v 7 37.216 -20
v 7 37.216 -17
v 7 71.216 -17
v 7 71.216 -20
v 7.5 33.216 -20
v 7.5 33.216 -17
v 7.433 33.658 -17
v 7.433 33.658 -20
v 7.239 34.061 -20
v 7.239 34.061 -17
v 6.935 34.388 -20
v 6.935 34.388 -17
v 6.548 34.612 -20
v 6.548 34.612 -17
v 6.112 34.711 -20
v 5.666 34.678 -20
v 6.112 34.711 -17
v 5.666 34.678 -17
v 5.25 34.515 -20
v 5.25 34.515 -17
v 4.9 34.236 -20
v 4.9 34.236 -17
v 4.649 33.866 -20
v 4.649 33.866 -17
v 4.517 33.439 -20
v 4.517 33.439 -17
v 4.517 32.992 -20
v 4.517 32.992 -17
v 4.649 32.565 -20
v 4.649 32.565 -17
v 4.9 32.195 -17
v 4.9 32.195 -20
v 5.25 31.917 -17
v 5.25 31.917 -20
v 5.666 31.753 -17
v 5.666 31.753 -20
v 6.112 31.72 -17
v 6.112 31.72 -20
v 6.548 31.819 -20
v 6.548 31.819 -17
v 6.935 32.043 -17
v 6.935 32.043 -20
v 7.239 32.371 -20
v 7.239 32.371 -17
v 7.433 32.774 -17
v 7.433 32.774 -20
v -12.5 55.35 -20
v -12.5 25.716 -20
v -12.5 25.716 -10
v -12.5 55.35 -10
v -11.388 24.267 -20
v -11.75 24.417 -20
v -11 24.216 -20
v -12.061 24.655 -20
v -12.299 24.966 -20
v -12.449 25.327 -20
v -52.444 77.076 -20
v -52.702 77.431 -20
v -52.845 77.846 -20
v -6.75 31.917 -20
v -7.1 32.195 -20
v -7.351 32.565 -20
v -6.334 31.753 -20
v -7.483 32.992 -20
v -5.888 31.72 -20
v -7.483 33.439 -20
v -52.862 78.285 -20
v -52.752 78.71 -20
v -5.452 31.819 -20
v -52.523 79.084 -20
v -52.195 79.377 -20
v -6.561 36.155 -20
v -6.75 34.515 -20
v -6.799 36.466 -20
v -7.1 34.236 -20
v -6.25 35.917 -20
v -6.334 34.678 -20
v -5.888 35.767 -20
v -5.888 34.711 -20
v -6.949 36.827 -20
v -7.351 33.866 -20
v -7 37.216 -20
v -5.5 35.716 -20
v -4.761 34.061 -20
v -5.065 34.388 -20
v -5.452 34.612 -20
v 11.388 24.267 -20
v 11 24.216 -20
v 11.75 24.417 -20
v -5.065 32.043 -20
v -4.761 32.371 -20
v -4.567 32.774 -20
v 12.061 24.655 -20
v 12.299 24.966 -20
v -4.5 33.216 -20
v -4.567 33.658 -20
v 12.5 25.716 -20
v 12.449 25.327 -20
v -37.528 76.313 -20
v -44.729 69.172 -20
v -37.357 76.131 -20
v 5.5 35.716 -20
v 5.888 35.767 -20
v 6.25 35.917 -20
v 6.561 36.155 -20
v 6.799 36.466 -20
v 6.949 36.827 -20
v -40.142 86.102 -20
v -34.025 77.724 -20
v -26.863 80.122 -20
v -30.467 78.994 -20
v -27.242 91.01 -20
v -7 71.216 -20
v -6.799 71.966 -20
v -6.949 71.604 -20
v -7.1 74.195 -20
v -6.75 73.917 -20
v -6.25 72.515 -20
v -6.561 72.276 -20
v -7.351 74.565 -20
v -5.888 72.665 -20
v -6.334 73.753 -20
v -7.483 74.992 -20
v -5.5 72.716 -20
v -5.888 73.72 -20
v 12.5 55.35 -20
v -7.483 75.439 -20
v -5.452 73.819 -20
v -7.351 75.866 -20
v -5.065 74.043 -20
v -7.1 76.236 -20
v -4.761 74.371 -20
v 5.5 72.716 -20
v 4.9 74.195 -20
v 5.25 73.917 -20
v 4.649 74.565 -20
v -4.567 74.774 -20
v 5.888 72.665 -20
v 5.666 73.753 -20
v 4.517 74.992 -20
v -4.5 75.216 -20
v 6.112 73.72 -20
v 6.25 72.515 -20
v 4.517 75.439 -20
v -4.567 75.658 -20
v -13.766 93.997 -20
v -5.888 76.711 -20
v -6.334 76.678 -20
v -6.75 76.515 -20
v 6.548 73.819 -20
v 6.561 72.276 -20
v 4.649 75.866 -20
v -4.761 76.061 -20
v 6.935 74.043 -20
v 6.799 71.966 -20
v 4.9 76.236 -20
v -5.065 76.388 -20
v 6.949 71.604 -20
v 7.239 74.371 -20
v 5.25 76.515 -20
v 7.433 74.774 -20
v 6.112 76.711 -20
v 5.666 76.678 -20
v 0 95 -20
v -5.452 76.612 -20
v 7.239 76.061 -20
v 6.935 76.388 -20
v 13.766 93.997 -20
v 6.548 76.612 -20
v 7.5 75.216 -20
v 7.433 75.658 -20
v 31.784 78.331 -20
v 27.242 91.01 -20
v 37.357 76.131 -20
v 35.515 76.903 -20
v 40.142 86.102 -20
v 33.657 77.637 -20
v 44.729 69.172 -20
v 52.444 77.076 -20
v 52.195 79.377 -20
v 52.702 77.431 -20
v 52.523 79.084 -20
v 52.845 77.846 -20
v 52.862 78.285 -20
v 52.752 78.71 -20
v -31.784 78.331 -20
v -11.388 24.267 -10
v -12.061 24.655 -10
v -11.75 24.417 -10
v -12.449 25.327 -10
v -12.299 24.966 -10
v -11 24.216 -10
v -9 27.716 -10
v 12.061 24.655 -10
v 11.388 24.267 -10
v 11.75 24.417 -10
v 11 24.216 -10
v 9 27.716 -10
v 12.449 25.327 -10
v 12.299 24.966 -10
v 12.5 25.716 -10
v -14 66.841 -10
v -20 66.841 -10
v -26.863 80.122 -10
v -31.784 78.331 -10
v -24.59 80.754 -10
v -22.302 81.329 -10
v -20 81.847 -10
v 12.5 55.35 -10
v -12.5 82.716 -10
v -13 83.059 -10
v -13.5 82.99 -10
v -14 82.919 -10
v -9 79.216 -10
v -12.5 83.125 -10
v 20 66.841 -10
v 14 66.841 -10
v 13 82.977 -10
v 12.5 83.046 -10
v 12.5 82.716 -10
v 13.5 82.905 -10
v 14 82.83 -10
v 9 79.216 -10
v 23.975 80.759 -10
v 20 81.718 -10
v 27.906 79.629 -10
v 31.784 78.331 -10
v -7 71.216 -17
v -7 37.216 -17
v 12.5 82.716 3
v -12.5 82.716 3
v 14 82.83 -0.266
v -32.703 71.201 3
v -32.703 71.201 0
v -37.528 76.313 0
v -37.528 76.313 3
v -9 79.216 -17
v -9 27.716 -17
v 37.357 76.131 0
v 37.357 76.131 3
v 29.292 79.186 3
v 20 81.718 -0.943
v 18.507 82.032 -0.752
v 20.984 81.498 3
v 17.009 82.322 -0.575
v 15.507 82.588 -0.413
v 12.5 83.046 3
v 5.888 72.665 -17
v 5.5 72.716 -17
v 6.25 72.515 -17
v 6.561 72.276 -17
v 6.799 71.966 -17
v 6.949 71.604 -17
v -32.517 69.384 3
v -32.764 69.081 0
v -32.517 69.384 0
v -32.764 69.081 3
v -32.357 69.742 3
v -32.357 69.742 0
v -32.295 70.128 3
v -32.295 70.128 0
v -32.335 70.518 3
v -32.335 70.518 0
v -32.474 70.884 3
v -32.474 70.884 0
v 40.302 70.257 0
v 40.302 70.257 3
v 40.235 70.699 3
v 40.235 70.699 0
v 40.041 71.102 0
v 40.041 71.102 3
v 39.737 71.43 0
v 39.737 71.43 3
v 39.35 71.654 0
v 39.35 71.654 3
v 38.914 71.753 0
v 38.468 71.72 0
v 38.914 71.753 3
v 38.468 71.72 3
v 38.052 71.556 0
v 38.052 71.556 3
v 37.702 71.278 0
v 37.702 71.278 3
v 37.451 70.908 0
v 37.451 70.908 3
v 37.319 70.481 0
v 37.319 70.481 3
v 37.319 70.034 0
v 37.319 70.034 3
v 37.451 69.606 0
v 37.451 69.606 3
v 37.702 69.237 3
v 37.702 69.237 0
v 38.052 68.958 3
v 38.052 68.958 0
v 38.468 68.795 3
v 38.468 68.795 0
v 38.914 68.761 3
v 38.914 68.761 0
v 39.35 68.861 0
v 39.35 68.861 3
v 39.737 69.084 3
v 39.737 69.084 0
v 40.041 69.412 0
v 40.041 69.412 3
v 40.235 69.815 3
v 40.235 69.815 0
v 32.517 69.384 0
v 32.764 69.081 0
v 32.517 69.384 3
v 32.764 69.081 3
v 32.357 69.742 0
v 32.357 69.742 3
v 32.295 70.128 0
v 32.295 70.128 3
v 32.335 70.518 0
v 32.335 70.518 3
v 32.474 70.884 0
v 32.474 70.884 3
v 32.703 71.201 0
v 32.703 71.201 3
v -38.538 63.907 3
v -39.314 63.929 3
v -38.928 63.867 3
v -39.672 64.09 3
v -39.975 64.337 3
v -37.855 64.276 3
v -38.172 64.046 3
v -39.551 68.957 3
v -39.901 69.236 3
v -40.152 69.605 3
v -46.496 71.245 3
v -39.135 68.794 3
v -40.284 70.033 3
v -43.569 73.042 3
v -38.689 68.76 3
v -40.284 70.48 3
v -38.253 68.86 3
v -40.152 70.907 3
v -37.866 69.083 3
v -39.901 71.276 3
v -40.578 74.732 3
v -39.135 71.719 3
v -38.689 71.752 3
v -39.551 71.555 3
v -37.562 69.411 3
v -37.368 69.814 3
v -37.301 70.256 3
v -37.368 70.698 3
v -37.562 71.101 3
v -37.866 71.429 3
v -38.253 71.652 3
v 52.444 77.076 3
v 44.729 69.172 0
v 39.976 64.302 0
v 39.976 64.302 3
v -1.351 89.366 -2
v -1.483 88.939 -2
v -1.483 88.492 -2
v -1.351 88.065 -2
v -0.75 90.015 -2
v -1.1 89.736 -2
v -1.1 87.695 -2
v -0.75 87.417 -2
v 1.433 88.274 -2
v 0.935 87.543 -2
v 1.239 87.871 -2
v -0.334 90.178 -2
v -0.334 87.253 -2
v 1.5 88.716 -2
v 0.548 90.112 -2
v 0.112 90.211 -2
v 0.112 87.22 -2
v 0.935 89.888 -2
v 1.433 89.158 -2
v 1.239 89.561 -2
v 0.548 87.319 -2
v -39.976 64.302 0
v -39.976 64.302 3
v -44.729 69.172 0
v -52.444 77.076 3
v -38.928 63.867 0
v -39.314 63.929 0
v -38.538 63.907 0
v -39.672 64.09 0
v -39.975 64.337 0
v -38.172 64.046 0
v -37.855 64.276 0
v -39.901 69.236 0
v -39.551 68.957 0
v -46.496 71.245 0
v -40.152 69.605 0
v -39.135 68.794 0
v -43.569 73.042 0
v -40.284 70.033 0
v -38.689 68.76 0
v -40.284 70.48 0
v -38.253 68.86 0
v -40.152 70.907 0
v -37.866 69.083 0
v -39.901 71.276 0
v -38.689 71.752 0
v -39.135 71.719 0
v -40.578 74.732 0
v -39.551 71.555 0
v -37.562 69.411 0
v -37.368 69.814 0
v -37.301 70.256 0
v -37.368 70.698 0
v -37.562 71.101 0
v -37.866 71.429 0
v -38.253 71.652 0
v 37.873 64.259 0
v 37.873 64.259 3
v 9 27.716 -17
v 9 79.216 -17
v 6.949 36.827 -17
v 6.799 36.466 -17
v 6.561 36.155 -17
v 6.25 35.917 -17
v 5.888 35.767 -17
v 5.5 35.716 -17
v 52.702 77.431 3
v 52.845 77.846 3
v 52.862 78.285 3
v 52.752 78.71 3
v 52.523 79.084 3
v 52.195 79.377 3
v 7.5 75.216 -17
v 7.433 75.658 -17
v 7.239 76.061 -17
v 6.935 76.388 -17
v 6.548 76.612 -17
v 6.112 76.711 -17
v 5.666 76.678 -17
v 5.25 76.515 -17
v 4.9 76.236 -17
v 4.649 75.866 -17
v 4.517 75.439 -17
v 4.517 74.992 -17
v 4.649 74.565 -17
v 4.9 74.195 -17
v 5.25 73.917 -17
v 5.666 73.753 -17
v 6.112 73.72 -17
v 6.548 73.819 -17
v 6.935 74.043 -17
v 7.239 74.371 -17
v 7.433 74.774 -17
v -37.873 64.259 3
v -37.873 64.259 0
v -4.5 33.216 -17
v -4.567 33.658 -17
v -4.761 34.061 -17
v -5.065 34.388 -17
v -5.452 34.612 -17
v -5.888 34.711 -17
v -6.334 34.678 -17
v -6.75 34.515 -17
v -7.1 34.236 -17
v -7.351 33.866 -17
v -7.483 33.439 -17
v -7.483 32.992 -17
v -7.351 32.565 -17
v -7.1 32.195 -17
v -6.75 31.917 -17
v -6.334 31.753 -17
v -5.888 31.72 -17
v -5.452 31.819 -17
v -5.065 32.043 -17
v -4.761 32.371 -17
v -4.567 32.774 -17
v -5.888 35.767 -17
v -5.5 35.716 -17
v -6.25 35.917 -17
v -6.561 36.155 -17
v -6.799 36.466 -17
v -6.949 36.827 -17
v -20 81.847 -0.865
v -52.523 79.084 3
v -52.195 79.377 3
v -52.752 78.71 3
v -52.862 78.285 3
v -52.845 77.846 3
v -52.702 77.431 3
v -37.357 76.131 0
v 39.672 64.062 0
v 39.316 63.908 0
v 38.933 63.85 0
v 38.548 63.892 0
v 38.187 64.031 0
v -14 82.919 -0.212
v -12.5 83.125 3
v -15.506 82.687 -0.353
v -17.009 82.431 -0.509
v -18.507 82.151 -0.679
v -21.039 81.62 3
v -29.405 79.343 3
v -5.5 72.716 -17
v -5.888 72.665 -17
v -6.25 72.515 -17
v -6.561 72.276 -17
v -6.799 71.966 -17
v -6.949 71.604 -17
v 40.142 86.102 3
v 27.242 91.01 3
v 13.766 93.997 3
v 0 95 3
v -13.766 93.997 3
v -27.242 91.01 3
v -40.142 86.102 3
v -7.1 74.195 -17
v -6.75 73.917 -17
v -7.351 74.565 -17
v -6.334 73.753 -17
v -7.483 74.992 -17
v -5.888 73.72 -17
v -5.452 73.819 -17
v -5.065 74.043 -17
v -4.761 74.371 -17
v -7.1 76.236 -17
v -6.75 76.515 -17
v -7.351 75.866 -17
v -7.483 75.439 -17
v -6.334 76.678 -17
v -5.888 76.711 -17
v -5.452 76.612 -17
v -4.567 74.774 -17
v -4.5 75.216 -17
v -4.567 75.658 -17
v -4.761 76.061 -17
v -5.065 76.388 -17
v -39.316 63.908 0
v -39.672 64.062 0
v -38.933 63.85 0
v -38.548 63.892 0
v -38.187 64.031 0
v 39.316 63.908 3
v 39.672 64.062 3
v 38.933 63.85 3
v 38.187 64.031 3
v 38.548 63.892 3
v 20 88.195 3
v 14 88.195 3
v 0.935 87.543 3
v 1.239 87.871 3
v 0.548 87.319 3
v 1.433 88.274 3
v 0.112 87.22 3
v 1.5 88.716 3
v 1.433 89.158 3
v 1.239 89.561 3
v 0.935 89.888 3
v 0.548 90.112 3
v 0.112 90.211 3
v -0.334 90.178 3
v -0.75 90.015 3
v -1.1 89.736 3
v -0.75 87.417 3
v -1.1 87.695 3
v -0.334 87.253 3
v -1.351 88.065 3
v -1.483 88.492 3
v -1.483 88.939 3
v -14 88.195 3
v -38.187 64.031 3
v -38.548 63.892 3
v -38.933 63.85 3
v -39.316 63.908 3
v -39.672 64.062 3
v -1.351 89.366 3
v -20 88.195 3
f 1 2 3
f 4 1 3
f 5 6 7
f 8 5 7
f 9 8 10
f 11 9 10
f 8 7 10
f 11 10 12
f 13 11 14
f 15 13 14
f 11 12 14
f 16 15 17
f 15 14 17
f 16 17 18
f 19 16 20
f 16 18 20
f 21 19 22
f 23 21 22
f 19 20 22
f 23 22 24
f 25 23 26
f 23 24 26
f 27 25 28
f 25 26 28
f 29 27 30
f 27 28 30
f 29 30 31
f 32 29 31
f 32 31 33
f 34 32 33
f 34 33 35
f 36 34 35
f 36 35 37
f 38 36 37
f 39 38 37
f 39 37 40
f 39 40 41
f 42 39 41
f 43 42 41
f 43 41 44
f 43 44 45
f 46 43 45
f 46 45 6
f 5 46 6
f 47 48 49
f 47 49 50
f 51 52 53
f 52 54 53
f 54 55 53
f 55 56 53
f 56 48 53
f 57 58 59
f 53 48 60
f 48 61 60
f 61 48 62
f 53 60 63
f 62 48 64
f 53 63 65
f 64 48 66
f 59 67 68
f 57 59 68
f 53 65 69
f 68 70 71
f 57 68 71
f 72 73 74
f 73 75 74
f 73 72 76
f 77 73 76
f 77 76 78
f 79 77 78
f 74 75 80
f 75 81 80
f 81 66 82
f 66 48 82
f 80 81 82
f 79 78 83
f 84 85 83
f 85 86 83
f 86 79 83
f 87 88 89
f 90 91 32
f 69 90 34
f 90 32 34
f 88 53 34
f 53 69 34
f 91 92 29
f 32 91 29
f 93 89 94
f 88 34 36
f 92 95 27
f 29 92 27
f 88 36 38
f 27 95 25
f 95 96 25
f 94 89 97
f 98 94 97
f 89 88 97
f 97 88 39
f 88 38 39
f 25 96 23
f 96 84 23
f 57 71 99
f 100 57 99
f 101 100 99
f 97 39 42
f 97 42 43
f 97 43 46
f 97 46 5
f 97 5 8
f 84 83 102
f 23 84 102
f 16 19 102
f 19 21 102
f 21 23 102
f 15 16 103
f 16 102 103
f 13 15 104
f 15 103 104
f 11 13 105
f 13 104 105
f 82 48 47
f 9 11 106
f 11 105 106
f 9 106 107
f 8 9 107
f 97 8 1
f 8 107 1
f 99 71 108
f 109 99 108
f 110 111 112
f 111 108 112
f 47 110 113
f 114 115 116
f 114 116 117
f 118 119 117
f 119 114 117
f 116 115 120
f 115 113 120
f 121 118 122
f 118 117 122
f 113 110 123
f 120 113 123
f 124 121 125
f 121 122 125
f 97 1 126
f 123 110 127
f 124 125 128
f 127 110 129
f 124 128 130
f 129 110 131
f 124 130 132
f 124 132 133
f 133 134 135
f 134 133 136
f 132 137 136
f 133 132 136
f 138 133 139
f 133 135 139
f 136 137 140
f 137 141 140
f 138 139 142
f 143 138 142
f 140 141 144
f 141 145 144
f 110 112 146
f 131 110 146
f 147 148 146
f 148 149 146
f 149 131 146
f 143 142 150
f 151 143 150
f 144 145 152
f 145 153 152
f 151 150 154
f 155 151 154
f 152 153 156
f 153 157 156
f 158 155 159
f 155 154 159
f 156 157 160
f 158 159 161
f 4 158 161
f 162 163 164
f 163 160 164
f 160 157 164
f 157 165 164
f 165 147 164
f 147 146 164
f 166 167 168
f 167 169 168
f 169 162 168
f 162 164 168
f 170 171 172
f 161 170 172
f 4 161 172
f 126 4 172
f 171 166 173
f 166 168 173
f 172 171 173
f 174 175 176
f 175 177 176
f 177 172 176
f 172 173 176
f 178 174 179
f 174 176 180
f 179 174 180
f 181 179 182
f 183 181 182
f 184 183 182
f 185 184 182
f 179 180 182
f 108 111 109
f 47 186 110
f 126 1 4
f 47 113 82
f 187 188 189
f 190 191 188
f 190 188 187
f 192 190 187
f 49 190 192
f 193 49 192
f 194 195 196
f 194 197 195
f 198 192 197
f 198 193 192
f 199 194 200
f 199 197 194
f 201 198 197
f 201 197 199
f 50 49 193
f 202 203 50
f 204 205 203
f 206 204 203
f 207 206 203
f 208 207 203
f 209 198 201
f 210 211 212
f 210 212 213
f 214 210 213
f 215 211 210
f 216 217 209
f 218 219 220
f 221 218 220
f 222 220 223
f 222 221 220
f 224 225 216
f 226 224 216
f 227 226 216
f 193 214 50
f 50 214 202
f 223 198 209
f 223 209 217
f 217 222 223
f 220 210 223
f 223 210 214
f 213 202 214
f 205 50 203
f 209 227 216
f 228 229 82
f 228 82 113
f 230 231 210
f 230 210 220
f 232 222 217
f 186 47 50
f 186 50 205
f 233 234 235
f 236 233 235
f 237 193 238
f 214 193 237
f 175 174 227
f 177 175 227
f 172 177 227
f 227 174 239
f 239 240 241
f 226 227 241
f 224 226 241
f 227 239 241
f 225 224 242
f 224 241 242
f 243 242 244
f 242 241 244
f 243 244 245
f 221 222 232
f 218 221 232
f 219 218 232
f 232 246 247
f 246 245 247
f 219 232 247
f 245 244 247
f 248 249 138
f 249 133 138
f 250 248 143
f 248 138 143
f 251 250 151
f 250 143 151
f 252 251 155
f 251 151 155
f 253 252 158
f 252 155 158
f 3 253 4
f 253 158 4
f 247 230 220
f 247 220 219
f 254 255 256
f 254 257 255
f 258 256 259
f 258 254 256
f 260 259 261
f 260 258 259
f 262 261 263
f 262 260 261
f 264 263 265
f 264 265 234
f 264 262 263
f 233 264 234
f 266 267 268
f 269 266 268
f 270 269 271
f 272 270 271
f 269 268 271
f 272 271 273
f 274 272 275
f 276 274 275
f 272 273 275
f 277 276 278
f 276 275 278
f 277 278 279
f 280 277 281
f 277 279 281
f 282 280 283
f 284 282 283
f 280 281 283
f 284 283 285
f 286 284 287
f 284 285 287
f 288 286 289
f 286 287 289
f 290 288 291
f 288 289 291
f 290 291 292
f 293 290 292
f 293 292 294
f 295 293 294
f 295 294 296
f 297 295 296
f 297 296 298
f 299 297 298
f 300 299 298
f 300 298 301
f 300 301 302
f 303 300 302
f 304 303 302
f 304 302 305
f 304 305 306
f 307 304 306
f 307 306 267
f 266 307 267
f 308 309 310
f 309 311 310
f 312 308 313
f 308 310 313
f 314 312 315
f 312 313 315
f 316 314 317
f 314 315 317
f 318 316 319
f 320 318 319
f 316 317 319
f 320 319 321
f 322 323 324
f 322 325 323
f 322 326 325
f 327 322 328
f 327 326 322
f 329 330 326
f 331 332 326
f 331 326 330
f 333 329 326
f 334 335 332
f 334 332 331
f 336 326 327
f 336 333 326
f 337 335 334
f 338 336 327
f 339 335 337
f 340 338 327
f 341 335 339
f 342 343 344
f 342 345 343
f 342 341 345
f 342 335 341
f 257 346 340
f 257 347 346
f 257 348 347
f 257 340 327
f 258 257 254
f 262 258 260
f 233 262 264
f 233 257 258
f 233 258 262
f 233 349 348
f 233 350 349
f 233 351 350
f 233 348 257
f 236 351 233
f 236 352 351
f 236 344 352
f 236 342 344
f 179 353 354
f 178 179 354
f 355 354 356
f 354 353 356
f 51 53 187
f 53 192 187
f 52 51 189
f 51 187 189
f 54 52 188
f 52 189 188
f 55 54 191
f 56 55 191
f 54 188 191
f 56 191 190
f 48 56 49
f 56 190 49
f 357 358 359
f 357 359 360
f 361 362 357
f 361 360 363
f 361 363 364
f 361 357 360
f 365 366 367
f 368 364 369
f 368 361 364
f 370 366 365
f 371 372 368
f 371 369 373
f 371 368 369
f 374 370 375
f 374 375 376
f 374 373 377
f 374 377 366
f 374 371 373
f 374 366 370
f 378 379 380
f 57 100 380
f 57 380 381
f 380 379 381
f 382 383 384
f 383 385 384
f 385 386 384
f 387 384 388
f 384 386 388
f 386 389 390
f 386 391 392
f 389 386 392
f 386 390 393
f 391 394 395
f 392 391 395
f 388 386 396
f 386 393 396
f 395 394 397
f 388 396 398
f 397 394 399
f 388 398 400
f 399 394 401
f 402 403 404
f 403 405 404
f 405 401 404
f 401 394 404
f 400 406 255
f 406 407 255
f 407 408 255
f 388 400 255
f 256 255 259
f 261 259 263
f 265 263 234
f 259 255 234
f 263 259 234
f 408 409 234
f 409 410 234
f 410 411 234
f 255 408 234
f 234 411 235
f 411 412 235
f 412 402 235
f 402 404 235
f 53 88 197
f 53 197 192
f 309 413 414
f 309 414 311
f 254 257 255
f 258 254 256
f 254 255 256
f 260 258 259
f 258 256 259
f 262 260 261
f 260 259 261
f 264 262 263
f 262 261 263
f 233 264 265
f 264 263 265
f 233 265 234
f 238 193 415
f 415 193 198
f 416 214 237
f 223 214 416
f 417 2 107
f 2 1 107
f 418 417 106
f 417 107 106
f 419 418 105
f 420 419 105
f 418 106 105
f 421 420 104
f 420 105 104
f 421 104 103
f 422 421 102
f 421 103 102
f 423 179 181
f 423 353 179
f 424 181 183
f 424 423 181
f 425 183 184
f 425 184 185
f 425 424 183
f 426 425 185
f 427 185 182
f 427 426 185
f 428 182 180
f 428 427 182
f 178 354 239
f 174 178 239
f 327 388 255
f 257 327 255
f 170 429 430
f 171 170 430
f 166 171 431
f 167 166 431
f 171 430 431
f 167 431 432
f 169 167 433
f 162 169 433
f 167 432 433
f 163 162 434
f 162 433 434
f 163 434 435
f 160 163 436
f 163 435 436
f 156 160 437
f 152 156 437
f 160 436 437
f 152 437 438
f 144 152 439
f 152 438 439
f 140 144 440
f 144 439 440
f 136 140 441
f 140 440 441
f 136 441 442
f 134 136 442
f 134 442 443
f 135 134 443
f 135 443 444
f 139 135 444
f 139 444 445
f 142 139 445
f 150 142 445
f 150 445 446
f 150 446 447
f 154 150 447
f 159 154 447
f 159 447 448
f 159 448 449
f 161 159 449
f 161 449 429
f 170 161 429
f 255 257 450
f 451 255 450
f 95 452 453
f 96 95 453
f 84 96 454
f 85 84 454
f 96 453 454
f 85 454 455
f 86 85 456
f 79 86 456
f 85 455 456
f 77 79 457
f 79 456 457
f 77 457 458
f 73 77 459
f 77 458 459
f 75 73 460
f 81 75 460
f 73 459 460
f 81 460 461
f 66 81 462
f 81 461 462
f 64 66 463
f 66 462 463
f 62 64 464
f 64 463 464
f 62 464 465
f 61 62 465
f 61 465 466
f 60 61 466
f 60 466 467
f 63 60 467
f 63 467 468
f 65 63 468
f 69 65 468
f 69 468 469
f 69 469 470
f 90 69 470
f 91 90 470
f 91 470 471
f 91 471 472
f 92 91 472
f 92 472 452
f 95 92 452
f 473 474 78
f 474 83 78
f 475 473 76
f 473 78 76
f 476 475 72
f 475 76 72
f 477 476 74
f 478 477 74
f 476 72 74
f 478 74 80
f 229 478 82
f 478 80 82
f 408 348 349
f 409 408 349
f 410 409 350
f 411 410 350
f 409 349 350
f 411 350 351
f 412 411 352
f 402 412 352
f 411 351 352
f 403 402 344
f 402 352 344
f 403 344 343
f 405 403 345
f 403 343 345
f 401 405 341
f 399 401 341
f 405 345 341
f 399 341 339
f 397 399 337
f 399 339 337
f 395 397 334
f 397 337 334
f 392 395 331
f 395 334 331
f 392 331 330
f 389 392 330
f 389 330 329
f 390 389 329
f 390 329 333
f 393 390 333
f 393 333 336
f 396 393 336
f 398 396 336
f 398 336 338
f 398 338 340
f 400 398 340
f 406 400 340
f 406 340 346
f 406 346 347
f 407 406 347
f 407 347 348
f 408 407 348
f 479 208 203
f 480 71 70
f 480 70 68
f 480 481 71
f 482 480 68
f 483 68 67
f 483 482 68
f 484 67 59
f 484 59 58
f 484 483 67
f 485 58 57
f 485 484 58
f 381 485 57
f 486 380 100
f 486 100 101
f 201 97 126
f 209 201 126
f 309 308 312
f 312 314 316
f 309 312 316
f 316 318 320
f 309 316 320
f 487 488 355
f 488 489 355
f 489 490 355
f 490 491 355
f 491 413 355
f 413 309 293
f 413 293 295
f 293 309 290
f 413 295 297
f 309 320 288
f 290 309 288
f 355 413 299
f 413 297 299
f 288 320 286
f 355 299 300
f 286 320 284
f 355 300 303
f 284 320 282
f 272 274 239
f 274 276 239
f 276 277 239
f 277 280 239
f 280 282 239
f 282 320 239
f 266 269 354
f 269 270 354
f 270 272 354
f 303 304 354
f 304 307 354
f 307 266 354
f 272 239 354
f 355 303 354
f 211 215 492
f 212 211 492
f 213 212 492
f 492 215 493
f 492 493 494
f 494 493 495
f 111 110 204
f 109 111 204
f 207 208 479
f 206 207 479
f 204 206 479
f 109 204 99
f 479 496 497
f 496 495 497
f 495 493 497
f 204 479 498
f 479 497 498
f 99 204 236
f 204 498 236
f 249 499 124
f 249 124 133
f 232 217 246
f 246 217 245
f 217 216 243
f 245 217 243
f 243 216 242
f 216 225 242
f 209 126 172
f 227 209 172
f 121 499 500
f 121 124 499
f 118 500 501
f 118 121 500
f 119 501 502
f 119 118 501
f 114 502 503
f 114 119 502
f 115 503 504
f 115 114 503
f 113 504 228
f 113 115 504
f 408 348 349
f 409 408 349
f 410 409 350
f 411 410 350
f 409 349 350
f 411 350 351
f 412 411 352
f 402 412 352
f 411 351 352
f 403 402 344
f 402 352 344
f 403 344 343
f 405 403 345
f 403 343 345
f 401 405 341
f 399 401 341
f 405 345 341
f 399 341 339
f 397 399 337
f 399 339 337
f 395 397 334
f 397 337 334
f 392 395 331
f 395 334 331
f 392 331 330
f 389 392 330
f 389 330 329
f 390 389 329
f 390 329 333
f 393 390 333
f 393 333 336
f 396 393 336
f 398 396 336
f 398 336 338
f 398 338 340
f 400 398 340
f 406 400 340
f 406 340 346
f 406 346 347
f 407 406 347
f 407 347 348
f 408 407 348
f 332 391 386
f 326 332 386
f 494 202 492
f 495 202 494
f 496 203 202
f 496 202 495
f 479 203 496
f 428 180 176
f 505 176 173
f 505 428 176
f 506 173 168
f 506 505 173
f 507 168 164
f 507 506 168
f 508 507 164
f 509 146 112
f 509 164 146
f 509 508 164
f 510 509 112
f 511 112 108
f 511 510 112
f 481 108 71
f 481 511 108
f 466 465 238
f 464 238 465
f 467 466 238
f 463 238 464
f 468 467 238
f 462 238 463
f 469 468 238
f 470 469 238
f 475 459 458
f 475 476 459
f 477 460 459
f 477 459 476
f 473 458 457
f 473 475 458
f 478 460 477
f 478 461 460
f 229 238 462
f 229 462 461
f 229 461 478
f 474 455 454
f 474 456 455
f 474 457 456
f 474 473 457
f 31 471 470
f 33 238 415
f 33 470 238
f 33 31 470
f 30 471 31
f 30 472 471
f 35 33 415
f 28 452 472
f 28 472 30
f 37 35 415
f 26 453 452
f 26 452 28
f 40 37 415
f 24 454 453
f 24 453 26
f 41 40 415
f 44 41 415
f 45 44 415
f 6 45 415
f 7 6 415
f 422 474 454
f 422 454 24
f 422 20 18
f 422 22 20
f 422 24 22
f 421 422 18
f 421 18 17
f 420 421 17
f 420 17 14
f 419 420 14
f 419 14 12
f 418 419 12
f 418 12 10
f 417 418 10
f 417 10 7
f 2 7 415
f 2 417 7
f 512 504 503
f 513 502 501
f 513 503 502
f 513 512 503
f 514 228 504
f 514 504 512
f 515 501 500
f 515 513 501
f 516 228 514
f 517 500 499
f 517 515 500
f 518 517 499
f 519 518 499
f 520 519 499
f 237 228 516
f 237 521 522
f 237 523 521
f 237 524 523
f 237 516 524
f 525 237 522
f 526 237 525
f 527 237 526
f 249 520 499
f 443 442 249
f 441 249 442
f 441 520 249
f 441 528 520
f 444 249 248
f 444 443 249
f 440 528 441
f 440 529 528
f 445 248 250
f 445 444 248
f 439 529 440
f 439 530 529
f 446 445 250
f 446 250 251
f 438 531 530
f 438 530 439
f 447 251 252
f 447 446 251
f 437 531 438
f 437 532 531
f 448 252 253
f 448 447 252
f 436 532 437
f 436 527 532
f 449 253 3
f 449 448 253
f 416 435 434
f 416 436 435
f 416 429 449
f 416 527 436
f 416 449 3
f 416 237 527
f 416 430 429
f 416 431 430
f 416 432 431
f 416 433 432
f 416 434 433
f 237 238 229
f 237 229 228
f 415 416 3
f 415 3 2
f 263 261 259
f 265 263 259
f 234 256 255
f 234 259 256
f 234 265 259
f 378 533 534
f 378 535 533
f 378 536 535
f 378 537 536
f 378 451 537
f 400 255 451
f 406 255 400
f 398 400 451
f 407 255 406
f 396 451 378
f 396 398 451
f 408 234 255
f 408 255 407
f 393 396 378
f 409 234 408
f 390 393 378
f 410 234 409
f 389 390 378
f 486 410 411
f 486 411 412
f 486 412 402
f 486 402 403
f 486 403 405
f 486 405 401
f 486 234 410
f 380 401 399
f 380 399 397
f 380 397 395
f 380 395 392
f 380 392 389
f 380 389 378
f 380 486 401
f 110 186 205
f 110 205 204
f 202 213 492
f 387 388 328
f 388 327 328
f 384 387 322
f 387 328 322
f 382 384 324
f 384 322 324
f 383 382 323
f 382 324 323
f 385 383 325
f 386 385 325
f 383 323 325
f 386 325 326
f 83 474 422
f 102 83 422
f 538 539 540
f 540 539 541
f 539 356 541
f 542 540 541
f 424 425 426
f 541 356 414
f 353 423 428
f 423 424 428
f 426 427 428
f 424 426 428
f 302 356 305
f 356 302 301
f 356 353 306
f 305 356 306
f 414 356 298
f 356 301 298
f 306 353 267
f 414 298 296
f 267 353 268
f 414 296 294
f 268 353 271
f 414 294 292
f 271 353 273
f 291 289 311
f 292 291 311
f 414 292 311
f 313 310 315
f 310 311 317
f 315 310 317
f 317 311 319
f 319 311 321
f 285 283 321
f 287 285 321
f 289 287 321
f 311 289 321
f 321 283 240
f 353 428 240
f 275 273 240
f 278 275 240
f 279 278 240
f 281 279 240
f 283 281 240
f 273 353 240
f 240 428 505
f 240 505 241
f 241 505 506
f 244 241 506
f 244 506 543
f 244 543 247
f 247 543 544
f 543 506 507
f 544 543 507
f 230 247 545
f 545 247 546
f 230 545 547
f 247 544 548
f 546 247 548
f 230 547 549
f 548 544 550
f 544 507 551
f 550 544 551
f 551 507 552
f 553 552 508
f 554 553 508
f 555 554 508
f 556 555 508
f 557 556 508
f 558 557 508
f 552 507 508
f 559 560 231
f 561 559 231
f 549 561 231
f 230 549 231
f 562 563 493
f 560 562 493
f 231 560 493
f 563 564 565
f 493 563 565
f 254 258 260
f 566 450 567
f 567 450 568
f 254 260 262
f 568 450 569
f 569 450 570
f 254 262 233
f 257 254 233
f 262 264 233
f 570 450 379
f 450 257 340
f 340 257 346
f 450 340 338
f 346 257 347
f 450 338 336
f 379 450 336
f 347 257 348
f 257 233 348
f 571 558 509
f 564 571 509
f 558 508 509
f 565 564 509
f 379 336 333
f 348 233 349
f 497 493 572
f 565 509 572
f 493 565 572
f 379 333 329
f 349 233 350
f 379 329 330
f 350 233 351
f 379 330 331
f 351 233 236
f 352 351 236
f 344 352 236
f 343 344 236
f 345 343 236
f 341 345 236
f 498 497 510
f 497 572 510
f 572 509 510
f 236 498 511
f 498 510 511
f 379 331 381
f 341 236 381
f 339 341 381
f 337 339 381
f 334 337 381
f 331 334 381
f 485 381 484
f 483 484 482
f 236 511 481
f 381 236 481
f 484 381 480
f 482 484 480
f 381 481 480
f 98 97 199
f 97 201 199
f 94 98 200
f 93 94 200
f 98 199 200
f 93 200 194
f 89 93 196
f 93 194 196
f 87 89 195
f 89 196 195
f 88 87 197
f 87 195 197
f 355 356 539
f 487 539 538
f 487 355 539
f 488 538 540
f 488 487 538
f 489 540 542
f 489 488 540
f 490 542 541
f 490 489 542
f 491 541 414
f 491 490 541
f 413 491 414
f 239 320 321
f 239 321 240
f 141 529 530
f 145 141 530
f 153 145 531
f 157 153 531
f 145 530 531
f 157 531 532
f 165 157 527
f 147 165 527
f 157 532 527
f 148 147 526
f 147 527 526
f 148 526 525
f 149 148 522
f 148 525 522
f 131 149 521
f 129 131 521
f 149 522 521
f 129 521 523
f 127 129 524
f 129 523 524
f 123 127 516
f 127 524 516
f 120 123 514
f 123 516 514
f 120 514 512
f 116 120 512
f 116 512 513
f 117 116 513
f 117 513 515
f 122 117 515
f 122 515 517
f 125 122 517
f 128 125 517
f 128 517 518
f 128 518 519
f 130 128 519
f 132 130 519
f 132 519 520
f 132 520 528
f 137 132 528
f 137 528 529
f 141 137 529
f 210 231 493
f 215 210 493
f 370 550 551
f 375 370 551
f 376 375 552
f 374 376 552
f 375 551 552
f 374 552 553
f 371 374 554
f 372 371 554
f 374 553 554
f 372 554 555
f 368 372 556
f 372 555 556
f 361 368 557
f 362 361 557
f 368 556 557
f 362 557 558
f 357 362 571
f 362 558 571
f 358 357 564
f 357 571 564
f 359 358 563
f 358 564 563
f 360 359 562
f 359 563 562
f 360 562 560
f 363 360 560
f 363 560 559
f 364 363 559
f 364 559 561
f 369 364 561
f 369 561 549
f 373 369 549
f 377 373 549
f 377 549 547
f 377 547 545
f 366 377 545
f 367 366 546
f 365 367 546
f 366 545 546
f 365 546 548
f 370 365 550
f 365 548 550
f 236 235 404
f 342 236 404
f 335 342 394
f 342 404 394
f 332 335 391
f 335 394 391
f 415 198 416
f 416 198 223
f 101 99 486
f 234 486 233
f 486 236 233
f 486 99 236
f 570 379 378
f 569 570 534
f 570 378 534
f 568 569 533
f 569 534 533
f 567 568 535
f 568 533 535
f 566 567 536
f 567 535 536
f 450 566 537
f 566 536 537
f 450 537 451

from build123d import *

# Parameters (mm, degrees)
CROQUIS1_R              = 100
SALIENTE_EXTRUIR1_DEPTH = 3
CROQUIS3_R              = 110
CORTAR_EXTRUIR1_DEPTH   = 3
REDONDEO1_R             = 10
CORTAR_EXTRUIR6_DEPTH   = 10
CROQUIS12_R             = 1.5
CORTAR_EXTRUIR7_DEPTH   = 142.453172607
CROQUIS9_R              = 1.5
CROQUIS9_W              = 4.5
CROQUIS9_H              = 8
CROQUIS9_W_2            = 8
CROQUIS9_H_2            = 4.5
CORTAR_EXTRUIR5_DEPTH   = 10
CORTAR_EXTRUIR9_DEPTH   = 142.453172607
SALIENTE_EXTRUIR3_DEPTH = 3
SALIENTE_EXTRUIR4_DEPTH = 23
CROQUIS23_W             = 25
CROQUIS23_H             = 75
SALIENTE_EXTRUIR5_DEPTH = 23
CROQUIS24_W             = 25
CROQUIS24_H             = 13
CORTAR_EXTRUIR10_DEPTH  = 58.5
CORTAR_EXTRUIR11_DEPTH  = 20
CROQUIS27_W             = 18
CROQUIS27_H             = 51.5
CORTAR_EXTRUIR12_DEPTH  = 7
CROQUIS28_R             = 1.5
CROQUIS28_W             = 14
CROQUIS28_H             = 37
CORTAR_EXTRUIR13_DEPTH  = 7
CROQUIS30_R             = 1.5
CORTAR_EXTRUIR14_DEPTH  = 5
REDONDEO2_R             = 1.5
REDONDEO3_R             = 1.5
REDONDEO4_R             = 1.5
CROQUIS33_R             = 100
CROQUIS33_R_2           = 95
CORTAR_EXTRUIR15_DEPTH  = 118.101726702
REDONDEO5_R             = 1.5
SALIENTE_EXTRUIR6_DEPTH = 10
SALIENTE_EXTRUIR7_DEPTH = 6


with BuildPart() as part:
    # Croquis1 → Saliente-Extruir1 (new body)
    with BuildSketch(Plane.XY):
        Circle(CROQUIS1_R)
    extrude(amount=SALIENTE_EXTRUIR1_DEPTH)

    # Croquis3 → Cortar-Extruir1 (cut)
    with BuildSketch(Plane.XY.offset(3)):
        with Locations((190, 0)):
            Circle(CROQUIS3_R)
    extrude(amount=-CORTAR_EXTRUIR1_DEPTH, mode=Mode.SUBTRACT)

    # Redondeo1
    redondeo1_edges = [part.edges().sort_by_distance(p)[0] for p in [
        (89.473684211, -44.659375654, 1.5),
        (89.473684211, 44.659375654, 1.5),
    ]]
    fillet(redondeo1_edges, radius=REDONDEO1_R)

    # Croquis5 → Cortar-Extruir6 (cut)
    with BuildSketch(Plane.XY.offset(3)):
        Polygon((-58.336309448, -83.085046789), (-83.085046789, -58.336309448), (-65.40737726, -40.658639918), (-40.658639918, -65.40737726), align=None)
        Polygon((-83.085046789, 58.336309448), (-58.336309448, 83.085046789), (-40.658639918, 65.40737726), (-65.40737726, 40.658639918), align=None)
        Polygon((58.336309448, -83.085046789), (83.085046789, -58.336309448), (65.40737726, -40.658639918), (40.658639918, -65.40737726), align=None)
        Polygon((58.336309448, 83.085046789), (83.085046789, 58.336309448), (65.40737726, 40.658639918), (40.658639918, 65.40737726), align=None)
    extrude(amount=-CORTAR_EXTRUIR6_DEPTH, mode=Mode.SUBTRACT)

    # Croquis12 → Cortar-Extruir7 (cut, through all)
    with BuildSketch(Plane.XY.offset(3)):
        with Locations((-63.604254904, -36.804908024)):
            Circle(CROQUIS12_R)
        with Locations((-36.804907897, -63.604255031)):
            Circle(CROQUIS12_R)
        with Locations((-47.666068056, -20.866721176)):
            Circle(CROQUIS12_R)
        with Locations((-20.866721049, -47.666068183)):
            Circle(CROQUIS12_R)
        with Locations(Location((47.666068183, 20.866721049, 0), (0, 0, 180))):
            Circle(CROQUIS12_R)
        with Locations(Location((20.866721176, 47.666068056, 0), (0, 0, 180))):
            Circle(CROQUIS12_R)
        with Locations(Location((63.604255031, 36.804907897, 0), (0, 0, 180))):
            Circle(CROQUIS12_R)
        with Locations(Location((36.804908024, 63.604254904, 0), (0, 0, 180))):
            Circle(CROQUIS12_R)
        with Locations((20.866721325, -47.666067908)):
            Circle(CROQUIS12_R)
        with Locations((47.666068332, -20.866720901)):
            Circle(CROQUIS12_R)
        with Locations((63.60425518, -36.804907749)):
            Circle(CROQUIS12_R)
        with Locations((36.804908173, -63.604254756)):
            Circle(CROQUIS12_R)
        with Locations(Location((-63.604254756, 36.804908173, 0), (0, 0, 180))):
            Circle(CROQUIS12_R)
        with Locations(Location((-36.804907749, 63.60425518, 0), (0, 0, 180))):
            Circle(CROQUIS12_R)
        with Locations(Location((-20.866720901, 47.666068332, 0), (0, 0, 180))):
            Circle(CROQUIS12_R)
        with Locations(Location((-47.666067908, 20.866721325, 0), (0, 0, 180))):
            Circle(CROQUIS12_R)
    extrude(amount=-CORTAR_EXTRUIR7_DEPTH, mode=Mode.SUBTRACT)

    # Croquis9 → Cortar-Extruir5 (cut)
    with BuildSketch(Plane.XY.offset(3)):
        with Locations((71.9, -4)):
            Circle(CROQUIS9_R)
        with Locations((35.959143483, 4)):
            Circle(CROQUIS9_R)
        with Locations((71.959143483, 4)):
            Circle(CROQUIS9_R)
        with Locations((35.9, -4)):
            Circle(CROQUIS9_R)
        with Locations((-91.190074744, 4)):
            Circle(CROQUIS9_R)
        with Locations((-91.190074744, -4)):
            Circle(CROQUIS9_R)
        with Locations((-55.190074744, 4)):
            Circle(CROQUIS9_R)
        with Locations((-55.190074744, -4)):
            Circle(CROQUIS9_R)
        with Locations((-4, 85)):
            Circle(CROQUIS9_R)
        with Locations((4, 85)):
            Circle(CROQUIS9_R)
        with Locations((-4, 49)):
            Circle(CROQUIS9_R)
        with Locations((4, 49)):
            Circle(CROQUIS9_R)
        with Locations((-4, -49)):
            Circle(CROQUIS9_R)
        with Locations((4, -49)):
            Circle(CROQUIS9_R)
        with Locations((4, -85)):
            Circle(CROQUIS9_R)
        with Locations((-4, -85)):
            Circle(CROQUIS9_R)
        with Locations((41.209143483, 0)):
            Rectangle(CROQUIS9_W, CROQUIS9_H)
        with Locations((0, -54.25)):
            Rectangle(CROQUIS9_W_2, CROQUIS9_H_2)
        with Locations((-60.440074744, 0)):
            Rectangle(CROQUIS9_W, CROQUIS9_H)
        with Locations((0, 54.25)):
            Rectangle(CROQUIS9_W_2, CROQUIS9_H_2)
    extrude(amount=-CORTAR_EXTRUIR5_DEPTH, mode=Mode.SUBTRACT)

    # Croquis13 → Cortar-Extruir9 (cut, through all)
    with BuildSketch(Plane.XY.offset(3)):
        with BuildLine():
            Line((-46.496345001, 71.245082342), (-40.658639918, 65.40737726))
            Line((-40.658639918, 65.40737726), (-65.40737726, 40.658639918))
            Line((-65.40737726, 40.658639918), (-81.993870249, 57.245132907))
            ThreePointArc((-81.993870249, 57.245132907), (-100, 0), (-81.993870249, -57.245132907))
            Line((-81.993870249, -57.245132907), (-65.40737726, -40.658639918))
            Line((-65.40737726, -40.658639918), (-40.658639918, -65.40737726))
            Line((-40.658639918, -65.40737726), (-57.245132907, -81.993870249))
            ThreePointArc((-57.245132907, -81.993870249), (0, -100), (57.245132907, -81.993870249))
            Line((57.245132907, -81.993870249), (40.658639918, -65.40737726))
            Line((40.658639918, -65.40737726), (65.40737726, -40.658639918))
            Line((65.40737726, -40.658639918), (81.993870249, -57.245132907))
            ThreePointArc((81.993870249, -57.245132907), (90.456214357, -50.775094972), (87.719298246, -40.480341508))
            ThreePointArc((87.719298246, -40.480341508), (80, 0), (87.719298246, 40.480341508))
            ThreePointArc((87.719298246, 40.480341508), (93.238979947, 51.725451206), (81.993870249, 57.245132907))
            Line((81.993870249, 57.245132907), (65.40737726, 40.658639918))
            Line((65.40737726, 40.658639918), (40.658639918, 65.40737726))
            Line((40.658639918, 65.40737726), (46.282518229, 71.031255571))
            ThreePointArc((46.282518229, 71.031255571), (-0.075166467, 84.913072149), (-46.496345001, 71.245082342))
        make_face()
    extrude(amount=-CORTAR_EXTRUIR9_DEPTH, mode=Mode.SUBTRACT)

    # Croquis14 → Saliente-Extruir3 (add)
    with BuildSketch(Plane(origin=(0, 0, 0), x_dir=(-1, 0, 0), z_dir=(0, 0, -1))):
        with BuildLine():
            Line((38.945518482, 63.246018717), (31.673642459, 70.110406462))
            Line((31.673642459, 70.110406462), (37.528482874, 76.312805746))
            ThreePointArc((37.528482874, 76.312805746), (42.081150122, 73.900579851), (46.496345001, 71.245082342))
            Line((46.496345001, 71.245082342), (38.945518482, 63.246018717))
        make_face()
        with BuildLine():
            Line((-38.945518482, 63.246018717), (-31.673642459, 70.110406462))
            Line((-31.673642459, 70.110406462), (-37.528482874, 76.312805746))
            ThreePointArc((-37.528482874, 76.312805746), (-42.081150122, 73.900579851), (-46.496345001, 71.245082342))
            Line((-46.496345001, 71.245082342), (-38.945518482, 63.246018717))
        make_face()
    extrude(amount=-SALIENTE_EXTRUIR3_DEPTH)


with BuildPart() as saliente_extruir3_piece_1:
    # of the separate pieces the step leaves, piece 1, a body of its own (saliente_extruir3_pieces)
    add(part.part.solids().sort_by_distance((38.945518482, 63.246018717, 0))[0])

    # Croquis15 → Saliente-Extruir4 (add)
    with BuildSketch(Plane.XY.offset(3)):
        with BuildLine():
            Line((57.245132907, 81.993870249), (38.945518482, 63.246018717))
            Line((38.945518482, 63.246018717), (31.673642459, 70.110406462))
            Line((31.673642459, 70.110406462), (37.356868188, 76.131003556))
            ThreePointArc((37.356868188, 76.131003556), (-0.067138098, 83.911872334), (-37.528482874, 76.312805746))
            Line((-37.528482874, 76.312805746), (-31.673642459, 70.110406462))
            Line((-31.673642459, 70.110406462), (-38.945518482, 63.246018717))
            Line((-38.945518482, 63.246018717), (-57.245132907, 81.993870249))
            ThreePointArc((-57.245132907, 81.993870249), (0, 100), (57.245132907, 81.993870249))
        make_face()
    extrude(amount=-SALIENTE_EXTRUIR4_DEPTH)

    # Croquis26 → Cortar-Extruir11 (cut)
    with BuildSketch(Plane(origin=(0, 0, -20), x_dir=(-1, 0, 0), z_dir=(0, 0, -1))):
        Polygon((-37.356868188, 76.131003556), (-31.673642459, 70.110406462), (-38.945518482, 63.246018717), (-44.729414099, 69.171587081), align=None)
        Polygon((31.673642459, 70.110406462), (38.945518482, 63.246018717), (44.729414099, 69.171587081), (37.356868188, 76.131003556), align=None)
    extrude(amount=-CORTAR_EXTRUIR11_DEPTH, mode=Mode.SUBTRACT)


with BuildPart() as saliente_extruir3_piece_2:
    # of the separate pieces the step leaves, piece 2, a body of its own (saliente_extruir3_pieces)
    add(part.part.solids().sort_by_distance((-31.673642459, 70.110406462, 0))[0])


with BuildPart() as body_3:
    # Croquis23 → Saliente-Extruir5 (new, through all)
    with BuildSketch(Plane(origin=(0, 0, -20), x_dir=(-1, 0, 0), z_dir=(0, 0, -1))):
        with Locations((0, 61.715674165)):
            Rectangle(CROQUIS23_W, CROQUIS23_H)
    extrude(amount=-SALIENTE_EXTRUIR5_DEPTH)

    # Croquis24 → Cortar-Extruir10 (cut)
    with BuildSketch(Plane.XZ.offset(-24.215674165)):
        with Locations((0, -3.5)):
            Rectangle(CROQUIS24_W, CROQUIS24_H)
    extrude(amount=-CORTAR_EXTRUIR10_DEPTH, mode=Mode.SUBTRACT)

    # Croquis27 → Cortar-Extruir12 (cut)
    with BuildSketch(Plane.XY.offset(-10)):
        with Locations((0, 53.465674165)):
            Rectangle(CROQUIS27_W, CROQUIS27_H)
    extrude(amount=-CORTAR_EXTRUIR12_DEPTH, mode=Mode.SUBTRACT)

    # Croquis28 → Cortar-Extruir13 (cut)
    with BuildSketch(Plane.XY.offset(-17)):
        with Locations((-6, 75.215674165)):
            Circle(CROQUIS28_R)
        with Locations((6, 75.215674165)):
            Circle(CROQUIS28_R)
        with Locations((-6, 33.215674165)):
            Circle(CROQUIS28_R)
        with Locations((6, 33.215674165)):
            Circle(CROQUIS28_R)
        with Locations((0, 54.215674165)):
            Rectangle(CROQUIS28_W, CROQUIS28_H)
    extrude(amount=-CORTAR_EXTRUIR13_DEPTH, mode=Mode.SUBTRACT)


with BuildPart() as cortar_extruir14_tool:
    # Croquis30 → Cortar-Extruir14 (new body)
    with BuildSketch(Plane.XY.offset(3)):
        with Locations((-38.800986703, 70.256139004)):
            Circle(CROQUIS30_R)
        with Locations((38.802062302, 70.257240949)):
            Circle(CROQUIS30_R)
        with Locations((0, 88.715674165)):
            Circle(CROQUIS30_R)
    extrude(amount=-CORTAR_EXTRUIR14_DEPTH)


with BuildPart() as saliente_extruir3_piece_1_1:
    add(saliente_extruir3_piece_1.part)

    # Cortar-Extruir14: cut by cortar_extruir14_tool
    add(cortar_extruir14_tool.part, mode=Mode.SUBTRACT)

    # Redondeo3
    redondeo3_edges = [saliente_extruir3_piece_1_1.edges().sort_by_distance(p)[0] for p in [
        (38.945518482, 63.246018717, 1.5),
        (31.673642459, 70.110406462, 1.5),
        (-57.245132907, 81.993870249, -8.5),
        (-38.945518482, 63.246018717, 1.5),
        (-31.673642459, 70.110406462, 1.5),
        (57.245132907, 81.993870249, -8.5),
    ]]
    fillet(redondeo3_edges, radius=REDONDEO3_R)


with BuildPart() as saliente_extruir3_piece_2_1:
    add(saliente_extruir3_piece_2.part)

    # Cortar-Extruir14: cut by cortar_extruir14_tool
    add(cortar_extruir14_tool.part, mode=Mode.SUBTRACT)

    # Redondeo4
    redondeo4_edges = [saliente_extruir3_piece_2_1.edges().sort_by_distance(p)[0] for p in [
        (-38.945518482, 63.246018717, 1.5),
        (-31.673642459, 70.110406462, 1.5),
    ]]
    fillet(redondeo4_edges, radius=REDONDEO4_R)


with BuildPart() as body_3_1:
    add(body_3.part)

    # Cortar-Extruir14: cut by cortar_extruir14_tool
    add(cortar_extruir14_tool.part, mode=Mode.SUBTRACT)

    # Redondeo2
    redondeo2_edges = [body_3_1.edges().sort_by_distance(p)[0] for p in [
        (12.5, 24.215674165, -15),
        (-12.5, 24.215674165, -15),
        (-7, 35.715674165, -18.5),
        (-7, 72.715674165, -18.5),
        (7, 72.715674165, -18.5),
        (7, 35.715674165, -18.5),
    ]]
    fillet(redondeo2_edges, radius=REDONDEO2_R)


with BuildPart() as cortar_extruir15_tool:
    # Croquis33 → Cortar-Extruir15 (new, through all)
    with BuildSketch(Plane.XY.offset(3)):
        Circle(CROQUIS33_R)
        Circle(CROQUIS33_R_2, mode=Mode.SUBTRACT)
    extrude(amount=-CORTAR_EXTRUIR15_DEPTH)


with BuildPart() as saliente_extruir3_piece_1_2:
    add(saliente_extruir3_piece_1_1.part)

    # Cortar-Extruir15: cut by cortar_extruir15_tool
    add(cortar_extruir15_tool.part, mode=Mode.SUBTRACT)

    # Redondeo5
    redondeo5_edges = [saliente_extruir3_piece_1_2.edges().sort_by_distance(p)[0] for p in [
        (53.702695744, 78.3646634, -8.5),
        (-53.702695744, 78.3646634, -8.5),
    ]]
    fillet(redondeo5_edges, radius=REDONDEO5_R)



with BuildPart() as body_3_2:
    add(body_3_1.part)

    # Cortar-Extruir15: cut by cortar_extruir15_tool
    add(cortar_extruir15_tool.part, mode=Mode.SUBTRACT)


with BuildPart() as saliente_extruir3_piece_1_3:
    add(saliente_extruir3_piece_1_2.part)

    add(body_3_2.part)  # Saliente-Extruir6 merges body 3
    # Croquis36 → Saliente-Extruir6 (add)
    with BuildSketch(Plane(origin=(0, 0, -20), x_dir=(-1, 0, 0), z_dir=(0, 0, -1))):
        Polygon((-12.5, 55.3499652), (-31.783628291, 78.331298493), (-12.5, 85.3499652), align=None)
        Polygon((12.5, 55.3499652), (31.783628291, 78.331298493), (12.5, 85.3499652), align=None)
    extrude(amount=-SALIENTE_EXTRUIR6_DEPTH)

    # Croquis37 → Saliente-Extruir7 (add)
    with BuildSketch(Plane(origin=(20, 0, 0), x_dir=(0, 0, -1), z_dir=(1, 0, 0))):
        Polygon((10, 66.840631847), (-3, 88.194788351), (10, 88.194788351), align=None)
    saliente_extruir7 = extrude(amount=-SALIENTE_EXTRUIR7_DEPTH)

    # Simetría1: Saliente-Extruir7 across plane
    add(saliente_extruir7.mirror(Plane(origin=(0, 0, 0), x_dir=(0, 0, 1), z_dir=(1, 0, 0))))


solid = Compound([saliente_extruir3_piece_2_1.part, saliente_extruir3_piece_1_3.part])
